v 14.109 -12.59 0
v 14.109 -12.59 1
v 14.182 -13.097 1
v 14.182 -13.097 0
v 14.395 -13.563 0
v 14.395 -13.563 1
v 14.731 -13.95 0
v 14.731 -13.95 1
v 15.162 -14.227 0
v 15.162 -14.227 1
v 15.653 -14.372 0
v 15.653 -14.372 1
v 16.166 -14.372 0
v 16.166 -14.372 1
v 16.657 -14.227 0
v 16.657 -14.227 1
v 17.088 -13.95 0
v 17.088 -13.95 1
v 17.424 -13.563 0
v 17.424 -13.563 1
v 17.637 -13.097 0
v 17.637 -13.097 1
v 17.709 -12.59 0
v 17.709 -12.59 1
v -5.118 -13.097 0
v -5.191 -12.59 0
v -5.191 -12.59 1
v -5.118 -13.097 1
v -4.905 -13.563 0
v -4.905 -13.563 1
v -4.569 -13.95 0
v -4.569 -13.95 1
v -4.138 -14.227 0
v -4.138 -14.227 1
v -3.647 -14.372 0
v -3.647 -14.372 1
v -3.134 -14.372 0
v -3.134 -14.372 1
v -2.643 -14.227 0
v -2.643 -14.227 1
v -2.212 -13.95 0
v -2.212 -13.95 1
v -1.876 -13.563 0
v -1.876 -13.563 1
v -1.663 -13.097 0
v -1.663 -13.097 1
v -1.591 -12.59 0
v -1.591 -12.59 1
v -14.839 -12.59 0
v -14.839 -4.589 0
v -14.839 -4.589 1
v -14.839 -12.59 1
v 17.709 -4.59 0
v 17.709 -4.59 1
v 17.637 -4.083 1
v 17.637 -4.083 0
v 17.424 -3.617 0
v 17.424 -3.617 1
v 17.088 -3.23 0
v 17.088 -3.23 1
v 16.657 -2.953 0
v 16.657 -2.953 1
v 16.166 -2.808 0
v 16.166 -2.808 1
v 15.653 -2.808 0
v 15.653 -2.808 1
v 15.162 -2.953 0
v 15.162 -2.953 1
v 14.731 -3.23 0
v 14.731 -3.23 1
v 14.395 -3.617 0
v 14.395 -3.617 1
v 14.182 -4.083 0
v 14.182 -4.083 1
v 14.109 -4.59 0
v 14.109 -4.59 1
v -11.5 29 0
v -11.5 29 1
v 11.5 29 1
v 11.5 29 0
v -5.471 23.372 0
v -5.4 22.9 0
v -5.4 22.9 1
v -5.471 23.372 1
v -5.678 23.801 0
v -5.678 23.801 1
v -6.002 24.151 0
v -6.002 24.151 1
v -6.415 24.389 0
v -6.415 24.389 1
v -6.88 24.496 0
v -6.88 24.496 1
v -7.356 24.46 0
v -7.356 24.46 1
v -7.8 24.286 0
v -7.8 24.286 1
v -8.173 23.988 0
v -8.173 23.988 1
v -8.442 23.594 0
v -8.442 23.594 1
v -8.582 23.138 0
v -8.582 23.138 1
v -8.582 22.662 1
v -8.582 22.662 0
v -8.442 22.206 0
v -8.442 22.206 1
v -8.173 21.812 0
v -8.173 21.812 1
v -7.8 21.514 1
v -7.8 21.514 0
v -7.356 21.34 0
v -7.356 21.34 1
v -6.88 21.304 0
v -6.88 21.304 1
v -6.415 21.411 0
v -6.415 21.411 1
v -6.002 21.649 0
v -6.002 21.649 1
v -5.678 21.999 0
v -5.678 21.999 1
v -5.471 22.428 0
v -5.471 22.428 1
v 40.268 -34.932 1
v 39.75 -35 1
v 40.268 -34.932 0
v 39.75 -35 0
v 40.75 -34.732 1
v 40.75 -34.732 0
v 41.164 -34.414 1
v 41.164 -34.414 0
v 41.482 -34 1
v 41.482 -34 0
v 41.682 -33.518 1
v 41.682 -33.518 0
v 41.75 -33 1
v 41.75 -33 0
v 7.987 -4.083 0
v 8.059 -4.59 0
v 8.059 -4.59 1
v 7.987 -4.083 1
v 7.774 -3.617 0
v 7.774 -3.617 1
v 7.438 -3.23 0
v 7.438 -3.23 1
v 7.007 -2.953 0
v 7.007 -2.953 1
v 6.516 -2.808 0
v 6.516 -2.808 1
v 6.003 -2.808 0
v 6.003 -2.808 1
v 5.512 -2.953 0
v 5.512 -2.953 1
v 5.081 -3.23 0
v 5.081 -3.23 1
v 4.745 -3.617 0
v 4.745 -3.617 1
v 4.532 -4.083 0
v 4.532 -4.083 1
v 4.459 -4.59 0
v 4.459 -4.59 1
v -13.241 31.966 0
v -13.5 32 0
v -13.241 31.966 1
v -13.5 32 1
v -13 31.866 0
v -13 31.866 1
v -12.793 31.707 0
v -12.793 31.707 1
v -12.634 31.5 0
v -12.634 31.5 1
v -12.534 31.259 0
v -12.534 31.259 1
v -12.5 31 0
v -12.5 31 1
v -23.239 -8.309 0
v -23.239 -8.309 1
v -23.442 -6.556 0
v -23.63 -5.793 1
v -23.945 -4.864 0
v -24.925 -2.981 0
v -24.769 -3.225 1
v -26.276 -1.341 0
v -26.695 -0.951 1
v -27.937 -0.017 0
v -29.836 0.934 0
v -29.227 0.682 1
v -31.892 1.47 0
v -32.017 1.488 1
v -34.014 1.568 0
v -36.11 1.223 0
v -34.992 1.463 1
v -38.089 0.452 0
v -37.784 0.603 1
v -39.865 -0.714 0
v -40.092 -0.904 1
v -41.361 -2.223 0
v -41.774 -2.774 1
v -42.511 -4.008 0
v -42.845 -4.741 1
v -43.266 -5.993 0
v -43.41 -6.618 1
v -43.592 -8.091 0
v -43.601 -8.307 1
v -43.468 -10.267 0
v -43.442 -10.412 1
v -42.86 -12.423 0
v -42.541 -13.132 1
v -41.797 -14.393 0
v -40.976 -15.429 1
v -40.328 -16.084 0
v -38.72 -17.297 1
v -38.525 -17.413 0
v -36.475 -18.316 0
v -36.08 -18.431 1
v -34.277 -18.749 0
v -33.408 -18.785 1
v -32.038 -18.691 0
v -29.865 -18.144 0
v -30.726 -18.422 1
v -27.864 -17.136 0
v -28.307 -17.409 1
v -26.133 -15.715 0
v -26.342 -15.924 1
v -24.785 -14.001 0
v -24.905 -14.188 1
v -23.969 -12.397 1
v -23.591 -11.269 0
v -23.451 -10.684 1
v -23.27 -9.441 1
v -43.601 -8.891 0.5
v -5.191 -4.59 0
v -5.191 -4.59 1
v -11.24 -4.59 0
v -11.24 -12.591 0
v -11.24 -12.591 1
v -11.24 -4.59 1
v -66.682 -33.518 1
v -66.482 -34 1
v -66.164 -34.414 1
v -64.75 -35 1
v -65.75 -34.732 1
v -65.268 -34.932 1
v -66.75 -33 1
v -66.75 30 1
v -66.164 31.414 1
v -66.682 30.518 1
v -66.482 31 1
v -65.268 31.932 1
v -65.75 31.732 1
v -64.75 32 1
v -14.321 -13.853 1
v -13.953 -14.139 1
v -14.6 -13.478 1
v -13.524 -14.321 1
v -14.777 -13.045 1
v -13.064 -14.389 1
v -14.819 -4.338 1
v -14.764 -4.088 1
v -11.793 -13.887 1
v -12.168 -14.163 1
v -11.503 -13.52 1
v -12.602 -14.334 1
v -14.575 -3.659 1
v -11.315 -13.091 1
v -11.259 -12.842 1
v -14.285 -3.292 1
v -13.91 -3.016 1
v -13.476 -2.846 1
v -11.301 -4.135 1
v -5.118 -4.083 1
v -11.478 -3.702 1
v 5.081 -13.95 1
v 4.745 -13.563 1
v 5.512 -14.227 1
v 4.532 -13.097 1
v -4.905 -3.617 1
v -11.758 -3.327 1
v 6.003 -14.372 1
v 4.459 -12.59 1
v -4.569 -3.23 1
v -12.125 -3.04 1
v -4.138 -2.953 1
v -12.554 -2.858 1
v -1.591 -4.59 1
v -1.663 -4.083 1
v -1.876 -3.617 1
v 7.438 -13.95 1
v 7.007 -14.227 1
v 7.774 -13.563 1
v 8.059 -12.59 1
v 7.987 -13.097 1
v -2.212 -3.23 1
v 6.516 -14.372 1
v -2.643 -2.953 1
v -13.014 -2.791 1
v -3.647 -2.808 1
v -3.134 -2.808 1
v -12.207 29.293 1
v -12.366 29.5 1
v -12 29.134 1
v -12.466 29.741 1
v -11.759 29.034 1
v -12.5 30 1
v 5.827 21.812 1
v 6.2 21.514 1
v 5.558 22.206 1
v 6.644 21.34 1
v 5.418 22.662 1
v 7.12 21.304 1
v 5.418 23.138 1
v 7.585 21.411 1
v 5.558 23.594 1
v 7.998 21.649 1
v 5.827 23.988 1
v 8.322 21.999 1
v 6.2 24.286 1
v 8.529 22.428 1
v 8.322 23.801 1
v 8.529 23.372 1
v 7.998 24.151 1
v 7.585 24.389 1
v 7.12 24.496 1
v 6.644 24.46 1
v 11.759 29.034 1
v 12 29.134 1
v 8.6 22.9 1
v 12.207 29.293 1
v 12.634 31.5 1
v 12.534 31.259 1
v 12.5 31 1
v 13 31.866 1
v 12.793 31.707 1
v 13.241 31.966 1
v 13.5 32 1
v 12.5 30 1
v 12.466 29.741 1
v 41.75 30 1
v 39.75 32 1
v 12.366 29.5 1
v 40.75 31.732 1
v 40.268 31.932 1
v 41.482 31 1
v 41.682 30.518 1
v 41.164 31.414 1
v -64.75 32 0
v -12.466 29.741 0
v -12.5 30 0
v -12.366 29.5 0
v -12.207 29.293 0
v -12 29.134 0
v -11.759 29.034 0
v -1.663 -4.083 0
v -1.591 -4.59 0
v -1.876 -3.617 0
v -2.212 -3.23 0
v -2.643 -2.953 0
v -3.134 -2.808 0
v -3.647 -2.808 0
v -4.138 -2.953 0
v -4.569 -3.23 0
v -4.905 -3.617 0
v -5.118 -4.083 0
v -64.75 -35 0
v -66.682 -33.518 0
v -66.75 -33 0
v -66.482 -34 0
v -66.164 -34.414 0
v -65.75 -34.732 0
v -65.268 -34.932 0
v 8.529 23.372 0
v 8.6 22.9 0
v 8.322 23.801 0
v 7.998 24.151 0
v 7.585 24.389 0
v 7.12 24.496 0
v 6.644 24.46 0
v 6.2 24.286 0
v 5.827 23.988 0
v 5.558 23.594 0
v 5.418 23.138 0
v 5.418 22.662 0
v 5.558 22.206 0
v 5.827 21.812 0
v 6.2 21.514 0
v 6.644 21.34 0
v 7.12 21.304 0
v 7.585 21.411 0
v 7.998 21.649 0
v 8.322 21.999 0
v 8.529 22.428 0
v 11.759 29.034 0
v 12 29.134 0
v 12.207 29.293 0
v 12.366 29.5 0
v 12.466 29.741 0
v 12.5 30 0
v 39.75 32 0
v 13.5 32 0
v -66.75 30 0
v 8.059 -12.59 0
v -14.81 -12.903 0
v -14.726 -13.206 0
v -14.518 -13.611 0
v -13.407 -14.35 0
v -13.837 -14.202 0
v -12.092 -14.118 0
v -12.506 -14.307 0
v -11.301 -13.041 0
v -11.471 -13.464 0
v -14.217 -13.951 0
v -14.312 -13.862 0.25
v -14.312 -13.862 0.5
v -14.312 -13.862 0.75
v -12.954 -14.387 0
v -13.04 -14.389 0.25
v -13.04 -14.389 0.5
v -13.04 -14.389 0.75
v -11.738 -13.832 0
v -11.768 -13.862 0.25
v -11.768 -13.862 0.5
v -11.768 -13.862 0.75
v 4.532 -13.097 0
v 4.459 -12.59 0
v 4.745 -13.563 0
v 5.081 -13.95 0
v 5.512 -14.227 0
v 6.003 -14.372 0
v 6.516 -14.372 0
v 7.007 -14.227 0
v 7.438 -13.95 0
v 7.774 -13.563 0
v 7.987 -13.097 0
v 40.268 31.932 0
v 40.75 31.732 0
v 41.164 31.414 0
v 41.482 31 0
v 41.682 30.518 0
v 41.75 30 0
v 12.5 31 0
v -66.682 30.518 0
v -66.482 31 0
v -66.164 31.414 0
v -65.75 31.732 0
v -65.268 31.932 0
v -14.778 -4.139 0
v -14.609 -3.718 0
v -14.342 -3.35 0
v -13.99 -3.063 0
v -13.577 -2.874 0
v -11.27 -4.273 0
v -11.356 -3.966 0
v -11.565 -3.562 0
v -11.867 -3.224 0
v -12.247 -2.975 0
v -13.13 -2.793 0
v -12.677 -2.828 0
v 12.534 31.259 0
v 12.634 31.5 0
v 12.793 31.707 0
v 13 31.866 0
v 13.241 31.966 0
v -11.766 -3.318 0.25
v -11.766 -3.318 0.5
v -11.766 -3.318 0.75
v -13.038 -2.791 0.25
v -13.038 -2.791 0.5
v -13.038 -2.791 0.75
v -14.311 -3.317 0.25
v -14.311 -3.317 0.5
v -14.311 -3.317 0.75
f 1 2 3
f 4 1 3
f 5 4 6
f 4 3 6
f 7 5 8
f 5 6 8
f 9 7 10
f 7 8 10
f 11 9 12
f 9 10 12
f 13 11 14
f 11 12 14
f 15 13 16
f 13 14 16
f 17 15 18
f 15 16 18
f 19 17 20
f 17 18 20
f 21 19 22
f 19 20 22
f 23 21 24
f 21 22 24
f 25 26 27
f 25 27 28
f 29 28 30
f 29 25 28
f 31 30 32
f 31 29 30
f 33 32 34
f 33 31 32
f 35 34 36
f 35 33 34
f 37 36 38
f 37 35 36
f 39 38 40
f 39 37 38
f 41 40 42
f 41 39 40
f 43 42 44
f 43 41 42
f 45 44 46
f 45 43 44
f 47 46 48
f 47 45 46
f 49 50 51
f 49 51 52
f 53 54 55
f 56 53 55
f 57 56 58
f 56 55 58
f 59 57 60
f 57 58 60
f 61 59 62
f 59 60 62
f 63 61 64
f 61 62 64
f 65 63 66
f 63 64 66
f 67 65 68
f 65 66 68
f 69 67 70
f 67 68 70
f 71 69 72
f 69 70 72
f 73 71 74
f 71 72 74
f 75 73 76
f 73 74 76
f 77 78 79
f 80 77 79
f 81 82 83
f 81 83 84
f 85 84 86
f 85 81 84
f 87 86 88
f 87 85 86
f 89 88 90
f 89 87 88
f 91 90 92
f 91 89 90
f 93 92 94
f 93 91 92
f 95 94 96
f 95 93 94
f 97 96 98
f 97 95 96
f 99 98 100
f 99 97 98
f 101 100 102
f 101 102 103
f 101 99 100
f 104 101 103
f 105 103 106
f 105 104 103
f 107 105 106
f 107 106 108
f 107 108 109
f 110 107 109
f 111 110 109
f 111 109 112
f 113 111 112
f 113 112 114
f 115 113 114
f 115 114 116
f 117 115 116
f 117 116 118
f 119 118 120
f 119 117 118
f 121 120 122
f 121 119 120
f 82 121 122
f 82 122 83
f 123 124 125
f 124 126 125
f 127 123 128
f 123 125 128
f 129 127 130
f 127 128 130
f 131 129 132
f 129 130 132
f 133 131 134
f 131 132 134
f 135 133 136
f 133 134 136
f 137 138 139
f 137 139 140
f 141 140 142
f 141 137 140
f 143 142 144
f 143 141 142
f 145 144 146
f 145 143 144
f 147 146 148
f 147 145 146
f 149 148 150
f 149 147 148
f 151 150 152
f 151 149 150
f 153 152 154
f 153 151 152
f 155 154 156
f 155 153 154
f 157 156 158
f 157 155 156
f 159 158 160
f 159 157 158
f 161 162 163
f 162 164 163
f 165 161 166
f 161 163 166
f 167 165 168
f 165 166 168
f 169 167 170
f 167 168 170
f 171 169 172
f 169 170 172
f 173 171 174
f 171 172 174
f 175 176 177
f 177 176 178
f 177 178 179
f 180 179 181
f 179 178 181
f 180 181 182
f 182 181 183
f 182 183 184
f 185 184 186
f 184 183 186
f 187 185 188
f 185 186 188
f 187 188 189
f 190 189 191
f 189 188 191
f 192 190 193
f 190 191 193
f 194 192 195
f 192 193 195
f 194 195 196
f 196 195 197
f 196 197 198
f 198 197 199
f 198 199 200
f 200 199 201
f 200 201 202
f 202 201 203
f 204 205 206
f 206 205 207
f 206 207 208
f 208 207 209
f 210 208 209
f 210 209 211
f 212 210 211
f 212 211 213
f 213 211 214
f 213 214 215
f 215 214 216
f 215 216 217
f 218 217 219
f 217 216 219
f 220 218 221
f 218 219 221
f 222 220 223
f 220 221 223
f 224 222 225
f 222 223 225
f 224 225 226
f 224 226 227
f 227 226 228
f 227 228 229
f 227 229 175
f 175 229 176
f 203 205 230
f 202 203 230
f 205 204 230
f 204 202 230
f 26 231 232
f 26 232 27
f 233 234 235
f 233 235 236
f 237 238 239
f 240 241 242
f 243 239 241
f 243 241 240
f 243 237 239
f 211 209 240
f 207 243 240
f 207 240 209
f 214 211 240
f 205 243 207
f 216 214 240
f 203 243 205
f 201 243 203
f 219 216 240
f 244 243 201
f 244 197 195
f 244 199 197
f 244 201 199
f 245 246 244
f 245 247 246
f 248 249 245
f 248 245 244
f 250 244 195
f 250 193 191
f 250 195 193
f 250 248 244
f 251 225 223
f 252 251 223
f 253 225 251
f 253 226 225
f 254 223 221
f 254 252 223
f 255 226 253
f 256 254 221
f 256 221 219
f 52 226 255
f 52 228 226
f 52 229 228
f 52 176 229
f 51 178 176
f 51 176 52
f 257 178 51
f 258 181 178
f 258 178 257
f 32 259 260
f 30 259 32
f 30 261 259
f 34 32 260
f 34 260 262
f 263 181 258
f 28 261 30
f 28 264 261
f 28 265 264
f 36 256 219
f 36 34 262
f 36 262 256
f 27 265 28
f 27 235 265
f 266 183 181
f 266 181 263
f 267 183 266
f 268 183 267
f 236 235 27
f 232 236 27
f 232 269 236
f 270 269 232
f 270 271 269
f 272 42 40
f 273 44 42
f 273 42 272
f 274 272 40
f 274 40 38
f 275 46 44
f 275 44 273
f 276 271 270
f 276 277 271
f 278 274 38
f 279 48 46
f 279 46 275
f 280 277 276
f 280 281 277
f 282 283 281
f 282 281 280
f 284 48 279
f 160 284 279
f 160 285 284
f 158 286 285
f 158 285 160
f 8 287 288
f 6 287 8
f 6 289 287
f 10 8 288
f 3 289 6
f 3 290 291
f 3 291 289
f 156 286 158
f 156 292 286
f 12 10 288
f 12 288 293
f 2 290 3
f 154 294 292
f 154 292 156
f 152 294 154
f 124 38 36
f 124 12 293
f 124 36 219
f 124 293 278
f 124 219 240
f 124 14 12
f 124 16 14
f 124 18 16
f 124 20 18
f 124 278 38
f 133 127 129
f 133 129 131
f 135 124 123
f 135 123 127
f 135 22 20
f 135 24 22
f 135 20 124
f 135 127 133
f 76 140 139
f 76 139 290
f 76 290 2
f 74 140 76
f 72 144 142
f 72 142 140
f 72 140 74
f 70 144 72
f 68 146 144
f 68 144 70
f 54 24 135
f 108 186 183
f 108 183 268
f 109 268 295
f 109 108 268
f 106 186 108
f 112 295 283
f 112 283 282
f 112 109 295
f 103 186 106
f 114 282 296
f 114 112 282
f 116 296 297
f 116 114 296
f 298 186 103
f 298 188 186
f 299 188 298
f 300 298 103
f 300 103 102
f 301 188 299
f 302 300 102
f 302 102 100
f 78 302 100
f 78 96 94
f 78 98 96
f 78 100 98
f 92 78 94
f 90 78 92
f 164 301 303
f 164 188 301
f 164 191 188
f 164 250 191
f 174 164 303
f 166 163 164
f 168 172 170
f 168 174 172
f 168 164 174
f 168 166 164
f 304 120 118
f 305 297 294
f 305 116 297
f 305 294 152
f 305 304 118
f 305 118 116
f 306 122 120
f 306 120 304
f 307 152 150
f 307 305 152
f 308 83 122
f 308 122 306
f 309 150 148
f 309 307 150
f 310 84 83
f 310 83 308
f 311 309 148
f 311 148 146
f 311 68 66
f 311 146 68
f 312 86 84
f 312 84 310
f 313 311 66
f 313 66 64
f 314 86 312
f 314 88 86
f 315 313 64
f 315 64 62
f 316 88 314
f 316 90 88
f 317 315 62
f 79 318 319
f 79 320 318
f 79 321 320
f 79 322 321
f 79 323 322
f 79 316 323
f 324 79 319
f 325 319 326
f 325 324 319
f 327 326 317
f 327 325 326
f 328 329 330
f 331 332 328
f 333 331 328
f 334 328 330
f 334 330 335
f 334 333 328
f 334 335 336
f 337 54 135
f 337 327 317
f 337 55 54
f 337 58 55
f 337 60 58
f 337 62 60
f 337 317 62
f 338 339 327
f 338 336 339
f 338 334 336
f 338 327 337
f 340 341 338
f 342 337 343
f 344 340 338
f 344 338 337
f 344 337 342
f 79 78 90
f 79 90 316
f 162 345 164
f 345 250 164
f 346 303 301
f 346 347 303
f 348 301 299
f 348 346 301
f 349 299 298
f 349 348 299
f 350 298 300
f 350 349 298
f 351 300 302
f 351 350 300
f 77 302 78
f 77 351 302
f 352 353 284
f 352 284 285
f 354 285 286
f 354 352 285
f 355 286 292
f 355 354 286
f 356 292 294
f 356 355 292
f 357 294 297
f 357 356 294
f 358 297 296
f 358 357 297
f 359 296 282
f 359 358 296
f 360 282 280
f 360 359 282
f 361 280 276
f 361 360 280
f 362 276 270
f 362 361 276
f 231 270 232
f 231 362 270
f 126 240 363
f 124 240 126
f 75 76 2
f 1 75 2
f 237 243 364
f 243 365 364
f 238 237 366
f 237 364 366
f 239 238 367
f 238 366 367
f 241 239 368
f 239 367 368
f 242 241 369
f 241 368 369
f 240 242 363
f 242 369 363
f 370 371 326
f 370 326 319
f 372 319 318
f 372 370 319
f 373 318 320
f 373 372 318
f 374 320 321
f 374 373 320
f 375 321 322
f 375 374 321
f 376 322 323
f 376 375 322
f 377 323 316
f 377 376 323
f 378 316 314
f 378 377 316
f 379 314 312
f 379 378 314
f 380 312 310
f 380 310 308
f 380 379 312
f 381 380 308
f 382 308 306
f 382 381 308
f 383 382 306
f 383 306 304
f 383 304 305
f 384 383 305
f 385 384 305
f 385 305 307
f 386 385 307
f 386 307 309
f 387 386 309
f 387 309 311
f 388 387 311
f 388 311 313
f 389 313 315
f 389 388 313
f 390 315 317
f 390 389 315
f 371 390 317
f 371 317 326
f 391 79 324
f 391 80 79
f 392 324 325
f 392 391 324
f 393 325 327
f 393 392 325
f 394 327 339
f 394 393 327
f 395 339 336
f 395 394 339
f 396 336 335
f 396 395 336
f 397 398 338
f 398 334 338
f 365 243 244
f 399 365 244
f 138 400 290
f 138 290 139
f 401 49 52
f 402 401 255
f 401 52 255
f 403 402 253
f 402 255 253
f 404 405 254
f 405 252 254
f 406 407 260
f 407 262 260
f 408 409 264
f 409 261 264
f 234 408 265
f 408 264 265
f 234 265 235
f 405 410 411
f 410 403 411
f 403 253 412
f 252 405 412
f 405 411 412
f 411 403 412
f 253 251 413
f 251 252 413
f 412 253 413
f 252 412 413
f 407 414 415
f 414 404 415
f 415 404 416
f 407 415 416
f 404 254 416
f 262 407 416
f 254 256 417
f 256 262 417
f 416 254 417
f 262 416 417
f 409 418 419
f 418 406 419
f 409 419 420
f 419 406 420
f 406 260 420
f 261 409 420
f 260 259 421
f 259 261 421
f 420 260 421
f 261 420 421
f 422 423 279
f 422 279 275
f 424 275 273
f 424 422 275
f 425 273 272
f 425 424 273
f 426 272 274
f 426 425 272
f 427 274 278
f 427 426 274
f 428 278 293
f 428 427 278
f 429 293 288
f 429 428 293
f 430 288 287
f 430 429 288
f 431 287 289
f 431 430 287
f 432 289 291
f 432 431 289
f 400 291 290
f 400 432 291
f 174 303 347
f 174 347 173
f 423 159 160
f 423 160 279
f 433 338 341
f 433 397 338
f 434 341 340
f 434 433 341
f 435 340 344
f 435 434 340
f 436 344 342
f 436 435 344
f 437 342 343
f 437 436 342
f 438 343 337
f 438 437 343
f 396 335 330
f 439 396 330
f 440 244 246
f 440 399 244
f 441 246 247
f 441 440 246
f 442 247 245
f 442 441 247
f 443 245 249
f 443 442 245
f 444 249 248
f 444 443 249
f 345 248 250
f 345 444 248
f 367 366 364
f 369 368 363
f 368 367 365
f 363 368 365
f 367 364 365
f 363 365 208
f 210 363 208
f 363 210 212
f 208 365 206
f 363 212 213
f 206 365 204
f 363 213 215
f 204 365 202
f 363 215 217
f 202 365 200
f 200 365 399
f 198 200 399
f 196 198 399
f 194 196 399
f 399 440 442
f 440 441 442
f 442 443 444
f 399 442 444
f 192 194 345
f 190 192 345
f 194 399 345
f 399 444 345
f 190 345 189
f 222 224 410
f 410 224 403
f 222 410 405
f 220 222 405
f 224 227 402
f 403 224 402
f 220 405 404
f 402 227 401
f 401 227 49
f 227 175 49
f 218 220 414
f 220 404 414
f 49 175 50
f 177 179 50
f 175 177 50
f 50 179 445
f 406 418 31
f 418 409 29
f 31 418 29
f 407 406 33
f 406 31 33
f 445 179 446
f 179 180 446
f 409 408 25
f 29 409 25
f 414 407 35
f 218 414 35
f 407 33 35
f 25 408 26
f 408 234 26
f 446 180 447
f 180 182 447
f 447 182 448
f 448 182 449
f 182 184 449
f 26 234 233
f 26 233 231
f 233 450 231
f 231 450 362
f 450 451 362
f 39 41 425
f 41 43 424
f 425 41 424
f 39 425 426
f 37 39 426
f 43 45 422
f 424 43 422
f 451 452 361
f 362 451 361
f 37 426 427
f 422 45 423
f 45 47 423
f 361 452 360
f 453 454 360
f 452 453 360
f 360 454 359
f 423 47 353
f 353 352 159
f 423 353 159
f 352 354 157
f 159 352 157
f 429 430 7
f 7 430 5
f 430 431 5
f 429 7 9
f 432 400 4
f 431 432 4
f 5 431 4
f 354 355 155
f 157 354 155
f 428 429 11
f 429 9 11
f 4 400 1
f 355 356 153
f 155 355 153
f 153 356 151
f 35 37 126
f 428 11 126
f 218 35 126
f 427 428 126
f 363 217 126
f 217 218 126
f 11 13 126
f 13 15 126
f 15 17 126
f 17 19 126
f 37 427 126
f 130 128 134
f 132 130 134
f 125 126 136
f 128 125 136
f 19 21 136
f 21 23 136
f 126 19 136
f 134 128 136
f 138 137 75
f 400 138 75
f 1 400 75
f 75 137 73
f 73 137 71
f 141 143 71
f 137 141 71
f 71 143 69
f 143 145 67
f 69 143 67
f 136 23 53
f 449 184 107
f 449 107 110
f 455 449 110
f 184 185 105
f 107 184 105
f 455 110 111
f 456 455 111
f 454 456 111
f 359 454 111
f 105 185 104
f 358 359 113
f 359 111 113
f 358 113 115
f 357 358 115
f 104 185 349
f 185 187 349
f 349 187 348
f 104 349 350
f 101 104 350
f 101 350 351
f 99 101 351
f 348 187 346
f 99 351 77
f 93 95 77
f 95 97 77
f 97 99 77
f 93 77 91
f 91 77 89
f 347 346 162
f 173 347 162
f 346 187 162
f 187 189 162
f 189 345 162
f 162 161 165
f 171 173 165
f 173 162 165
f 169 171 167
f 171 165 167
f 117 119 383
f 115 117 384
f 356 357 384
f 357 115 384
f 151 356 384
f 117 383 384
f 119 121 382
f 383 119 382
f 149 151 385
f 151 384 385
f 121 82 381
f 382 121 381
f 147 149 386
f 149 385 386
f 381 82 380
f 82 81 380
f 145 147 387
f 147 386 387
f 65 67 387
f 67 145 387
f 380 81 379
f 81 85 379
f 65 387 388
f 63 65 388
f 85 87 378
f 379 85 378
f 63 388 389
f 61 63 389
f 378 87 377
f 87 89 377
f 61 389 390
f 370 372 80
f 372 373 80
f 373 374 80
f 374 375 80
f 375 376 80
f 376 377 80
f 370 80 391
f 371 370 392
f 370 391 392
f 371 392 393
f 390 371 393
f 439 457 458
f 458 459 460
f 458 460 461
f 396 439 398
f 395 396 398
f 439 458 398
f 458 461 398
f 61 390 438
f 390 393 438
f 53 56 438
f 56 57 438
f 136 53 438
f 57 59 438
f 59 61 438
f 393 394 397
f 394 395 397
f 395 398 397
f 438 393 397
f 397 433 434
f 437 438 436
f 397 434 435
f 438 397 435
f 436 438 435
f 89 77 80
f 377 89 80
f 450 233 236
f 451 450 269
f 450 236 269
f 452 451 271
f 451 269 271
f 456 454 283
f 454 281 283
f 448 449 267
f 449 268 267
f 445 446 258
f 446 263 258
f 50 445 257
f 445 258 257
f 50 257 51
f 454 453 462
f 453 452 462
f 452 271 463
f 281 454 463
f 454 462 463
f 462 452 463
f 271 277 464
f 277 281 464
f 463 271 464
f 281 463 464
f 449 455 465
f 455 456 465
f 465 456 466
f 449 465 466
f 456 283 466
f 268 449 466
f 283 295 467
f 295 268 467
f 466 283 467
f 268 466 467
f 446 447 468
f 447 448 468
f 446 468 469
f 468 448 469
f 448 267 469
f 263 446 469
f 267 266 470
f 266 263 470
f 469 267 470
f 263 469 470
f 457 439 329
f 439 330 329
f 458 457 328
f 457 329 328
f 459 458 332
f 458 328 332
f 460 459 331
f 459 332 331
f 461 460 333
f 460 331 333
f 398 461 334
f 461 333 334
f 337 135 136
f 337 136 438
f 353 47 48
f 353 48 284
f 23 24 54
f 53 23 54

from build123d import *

# Parameters (mm, degrees)
SKETCH_1_W          = 127.5
SKETCH_1_H          = 70
SKETCH_1_R          = 1.6
EXTRUDE_1_DEPTH     = 1
SKETCH_2_W          = 127.5
SKETCH_2_H          = 3
CUT_EXTRUDE_1_DEPTH = 10
SKETCH_3_W          = 22
SKETCH_3_H          = 67
CUT_EXTRUDE_2_DEPTH = 10
SKETCH_4_W          = 3
SKETCH_4_H          = 67
EXTRUDE_3_DEPTH     = 1
CUT_EXTRUDE_3_DEPTH = 5
FILLET_1_R          = 2
SKETCH_6_W          = 25
SKETCH_6_H          = 6
CUT_EXTRUDE_4_DEPTH = 10
FILLET_2_R          = 1


with BuildPart() as part:
    # 草图1 → 凸台-拉伸1 (new body)
    with BuildSketch(Plane.XY):
        Rectangle(SKETCH_1_W, SKETCH_1_H)
        with Locations((-7, 22.9)):
            Circle(SKETCH_1_R, mode=Mode.SUBTRACT)
        with Locations((7, 22.9)):
            Circle(SKETCH_1_R, mode=Mode.SUBTRACT)
    extrude(amount=EXTRUDE_1_DEPTH)

    # 草图2 → 切除-拉伸1 (cut)
    with BuildSketch(Plane.XY.offset(1)):
        with Locations((0, 33.5)):
            Rectangle(SKETCH_2_W, SKETCH_2_H)
    extrude(amount=-CUT_EXTRUDE_1_DEPTH, mode=Mode.SUBTRACT)

    # 草图3 → 切除-拉伸2 (cut)
    with BuildSketch(Plane.XY.offset(1)):
        with Locations((52.75, -1.5)):
            Rectangle(SKETCH_3_W, SKETCH_3_H)
    extrude(amount=-CUT_EXTRUDE_2_DEPTH, mode=Mode.SUBTRACT)

    # 草图4 → 凸台-拉伸3 (add)
    with BuildSketch(Plane.XY.offset(1)):
        with Locations((-65.25, -1.5)):
            Rectangle(SKETCH_4_W, SKETCH_4_H)
    extrude(amount=-EXTRUDE_3_DEPTH)

    # 草图5 → 切除-拉伸3 (cut, symmetric)
    with BuildSketch(Plane.XY.offset(1)):
        with BuildLine():
            add(Edge.make_bspline(
                [(-23.239204387, -8.309235678), (-23.820747006, 12.052355547), (-44.182338231, 11.470812929), (-43.600795613, -8.890778296), (-43.019252994, -29.252369521), (-22.657661769, -28.670826903), (-23.239204387, -8.309235678)],
                knots=[0, 0, 0, 0, 0.5, 0.5, 0.5, 1, 1, 1, 1], degree=3, weights=[1, 0.333333333, 0.333333333, 1, 0.333333333, 0.333333333, 1]))
        make_face()
        with BuildLine():
            Line((-11.240001226, -12.590835312), (-11.239812554, -4.590030484))
            add(Edge.make_bspline(
                [(-11.239812554, -4.590030484), (-11.23965851, -4.131191724), (-11.628394939, -3.175174974), (-13.03773959, -2.598676522), (-14.448144996, -3.173577827), (-14.838335624, -4.130052792), (-14.838682322, -4.589251905)],
                knots=[0.000124436, 0.000124436, 0.000124436, 0.000124436, 0.250093327, 0.500062218, 0.750031109, 1, 1, 1, 1], degree=3))
            Line((-14.838682322, -4.589251905), (-14.839059277, -12.589975952))
            add(Edge.make_bspline(
                [(-14.839059277, -12.589975952), (-14.83906612, -13.048792969), (-14.45006572, -14.004600337), (-13.04067713, -14.58087189), (-11.630099776, -14.005244049), (-11.240750672, -13.049730112), (-11.240001226, -12.590835312)],
                knots=[-6.415e-06, -6.415e-06, -6.415e-06, -6.415e-06, 0.250075228, 0.50015687, 0.750238513, 1.000320156, 1.000320156, 1.000320156, 1.000320156], degree=3))
        make_face()
        with BuildLine():
            Line((-1.590572104, -12.590006951), (-1.590572104, -4.5900069))
            ThreePointArc((-1.590572104, -4.5900069), (-3.39056929, -2.790009714), (-5.190566476, -4.5900069))
            Line((-5.190566476, -4.5900069), (-5.190566476, -12.590006951))
            ThreePointArc((-5.190566476, -12.590006951), (-3.39056929, -14.390004137), (-1.590572104, -12.590006951))
        make_face()
        with BuildLine():
            Line((8.059432501, -12.590006951), (8.059432501, -4.5900069))
            ThreePointArc((8.059432501, -4.5900069), (6.259435314, -2.790009714), (4.459438128, -4.5900069))
            Line((4.459438128, -4.5900069), (4.459438128, -12.590006951))
            ThreePointArc((4.459438128, -12.590006951), (6.259435314, -14.390004137), (8.059432501, -12.590006951))
        make_face()
        with BuildLine():
            Line((17.709430966, -12.590006951), (17.709430966, -4.5900069))
            ThreePointArc((17.709430966, -4.5900069), (15.909433779, -2.790009714), (14.109436593, -4.5900069))
            Line((14.109436593, -4.5900069), (14.109436593, -12.590006951))
            ThreePointArc((14.109436593, -12.590006951), (15.909433779, -14.390004137), (17.709430966, -12.590006951))
        make_face()
    extrude(amount=CUT_EXTRUDE_3_DEPTH, both=True, mode=Mode.SUBTRACT)

    # 圆角1
    fillet_1_edges = [part.edges().sort_by_distance(p)[0] for p in [
        (41.75, 32, 0.5),
        (41.75, -35, 0.5),
        (-66.75, -35, 0.5),
        (-66.75, 32, 0.5),
    ]]
    fillet(fillet_1_edges, radius=FILLET_1_R)

    # 草图6 → 切除-拉伸4 (cut)
    with BuildSketch(Plane.XY.offset(1)):
        with Locations((0, 32)):
            Rectangle(SKETCH_6_W, SKETCH_6_H)
    extrude(amount=-CUT_EXTRUDE_4_DEPTH, mode=Mode.SUBTRACT)

    # 圆角2
    fillet_2_edges = [part.edges().sort_by_distance(p)[0] for p in [
        (-12.5, 32, 0.5),
        (12.5, 32, 0.5),
        (12.5, 29, 0.5),
        (-12.5, 29, 0.5),
    ]]
    fillet(fillet_2_edges, radius=FILLET_2_R)


solid = part.part
